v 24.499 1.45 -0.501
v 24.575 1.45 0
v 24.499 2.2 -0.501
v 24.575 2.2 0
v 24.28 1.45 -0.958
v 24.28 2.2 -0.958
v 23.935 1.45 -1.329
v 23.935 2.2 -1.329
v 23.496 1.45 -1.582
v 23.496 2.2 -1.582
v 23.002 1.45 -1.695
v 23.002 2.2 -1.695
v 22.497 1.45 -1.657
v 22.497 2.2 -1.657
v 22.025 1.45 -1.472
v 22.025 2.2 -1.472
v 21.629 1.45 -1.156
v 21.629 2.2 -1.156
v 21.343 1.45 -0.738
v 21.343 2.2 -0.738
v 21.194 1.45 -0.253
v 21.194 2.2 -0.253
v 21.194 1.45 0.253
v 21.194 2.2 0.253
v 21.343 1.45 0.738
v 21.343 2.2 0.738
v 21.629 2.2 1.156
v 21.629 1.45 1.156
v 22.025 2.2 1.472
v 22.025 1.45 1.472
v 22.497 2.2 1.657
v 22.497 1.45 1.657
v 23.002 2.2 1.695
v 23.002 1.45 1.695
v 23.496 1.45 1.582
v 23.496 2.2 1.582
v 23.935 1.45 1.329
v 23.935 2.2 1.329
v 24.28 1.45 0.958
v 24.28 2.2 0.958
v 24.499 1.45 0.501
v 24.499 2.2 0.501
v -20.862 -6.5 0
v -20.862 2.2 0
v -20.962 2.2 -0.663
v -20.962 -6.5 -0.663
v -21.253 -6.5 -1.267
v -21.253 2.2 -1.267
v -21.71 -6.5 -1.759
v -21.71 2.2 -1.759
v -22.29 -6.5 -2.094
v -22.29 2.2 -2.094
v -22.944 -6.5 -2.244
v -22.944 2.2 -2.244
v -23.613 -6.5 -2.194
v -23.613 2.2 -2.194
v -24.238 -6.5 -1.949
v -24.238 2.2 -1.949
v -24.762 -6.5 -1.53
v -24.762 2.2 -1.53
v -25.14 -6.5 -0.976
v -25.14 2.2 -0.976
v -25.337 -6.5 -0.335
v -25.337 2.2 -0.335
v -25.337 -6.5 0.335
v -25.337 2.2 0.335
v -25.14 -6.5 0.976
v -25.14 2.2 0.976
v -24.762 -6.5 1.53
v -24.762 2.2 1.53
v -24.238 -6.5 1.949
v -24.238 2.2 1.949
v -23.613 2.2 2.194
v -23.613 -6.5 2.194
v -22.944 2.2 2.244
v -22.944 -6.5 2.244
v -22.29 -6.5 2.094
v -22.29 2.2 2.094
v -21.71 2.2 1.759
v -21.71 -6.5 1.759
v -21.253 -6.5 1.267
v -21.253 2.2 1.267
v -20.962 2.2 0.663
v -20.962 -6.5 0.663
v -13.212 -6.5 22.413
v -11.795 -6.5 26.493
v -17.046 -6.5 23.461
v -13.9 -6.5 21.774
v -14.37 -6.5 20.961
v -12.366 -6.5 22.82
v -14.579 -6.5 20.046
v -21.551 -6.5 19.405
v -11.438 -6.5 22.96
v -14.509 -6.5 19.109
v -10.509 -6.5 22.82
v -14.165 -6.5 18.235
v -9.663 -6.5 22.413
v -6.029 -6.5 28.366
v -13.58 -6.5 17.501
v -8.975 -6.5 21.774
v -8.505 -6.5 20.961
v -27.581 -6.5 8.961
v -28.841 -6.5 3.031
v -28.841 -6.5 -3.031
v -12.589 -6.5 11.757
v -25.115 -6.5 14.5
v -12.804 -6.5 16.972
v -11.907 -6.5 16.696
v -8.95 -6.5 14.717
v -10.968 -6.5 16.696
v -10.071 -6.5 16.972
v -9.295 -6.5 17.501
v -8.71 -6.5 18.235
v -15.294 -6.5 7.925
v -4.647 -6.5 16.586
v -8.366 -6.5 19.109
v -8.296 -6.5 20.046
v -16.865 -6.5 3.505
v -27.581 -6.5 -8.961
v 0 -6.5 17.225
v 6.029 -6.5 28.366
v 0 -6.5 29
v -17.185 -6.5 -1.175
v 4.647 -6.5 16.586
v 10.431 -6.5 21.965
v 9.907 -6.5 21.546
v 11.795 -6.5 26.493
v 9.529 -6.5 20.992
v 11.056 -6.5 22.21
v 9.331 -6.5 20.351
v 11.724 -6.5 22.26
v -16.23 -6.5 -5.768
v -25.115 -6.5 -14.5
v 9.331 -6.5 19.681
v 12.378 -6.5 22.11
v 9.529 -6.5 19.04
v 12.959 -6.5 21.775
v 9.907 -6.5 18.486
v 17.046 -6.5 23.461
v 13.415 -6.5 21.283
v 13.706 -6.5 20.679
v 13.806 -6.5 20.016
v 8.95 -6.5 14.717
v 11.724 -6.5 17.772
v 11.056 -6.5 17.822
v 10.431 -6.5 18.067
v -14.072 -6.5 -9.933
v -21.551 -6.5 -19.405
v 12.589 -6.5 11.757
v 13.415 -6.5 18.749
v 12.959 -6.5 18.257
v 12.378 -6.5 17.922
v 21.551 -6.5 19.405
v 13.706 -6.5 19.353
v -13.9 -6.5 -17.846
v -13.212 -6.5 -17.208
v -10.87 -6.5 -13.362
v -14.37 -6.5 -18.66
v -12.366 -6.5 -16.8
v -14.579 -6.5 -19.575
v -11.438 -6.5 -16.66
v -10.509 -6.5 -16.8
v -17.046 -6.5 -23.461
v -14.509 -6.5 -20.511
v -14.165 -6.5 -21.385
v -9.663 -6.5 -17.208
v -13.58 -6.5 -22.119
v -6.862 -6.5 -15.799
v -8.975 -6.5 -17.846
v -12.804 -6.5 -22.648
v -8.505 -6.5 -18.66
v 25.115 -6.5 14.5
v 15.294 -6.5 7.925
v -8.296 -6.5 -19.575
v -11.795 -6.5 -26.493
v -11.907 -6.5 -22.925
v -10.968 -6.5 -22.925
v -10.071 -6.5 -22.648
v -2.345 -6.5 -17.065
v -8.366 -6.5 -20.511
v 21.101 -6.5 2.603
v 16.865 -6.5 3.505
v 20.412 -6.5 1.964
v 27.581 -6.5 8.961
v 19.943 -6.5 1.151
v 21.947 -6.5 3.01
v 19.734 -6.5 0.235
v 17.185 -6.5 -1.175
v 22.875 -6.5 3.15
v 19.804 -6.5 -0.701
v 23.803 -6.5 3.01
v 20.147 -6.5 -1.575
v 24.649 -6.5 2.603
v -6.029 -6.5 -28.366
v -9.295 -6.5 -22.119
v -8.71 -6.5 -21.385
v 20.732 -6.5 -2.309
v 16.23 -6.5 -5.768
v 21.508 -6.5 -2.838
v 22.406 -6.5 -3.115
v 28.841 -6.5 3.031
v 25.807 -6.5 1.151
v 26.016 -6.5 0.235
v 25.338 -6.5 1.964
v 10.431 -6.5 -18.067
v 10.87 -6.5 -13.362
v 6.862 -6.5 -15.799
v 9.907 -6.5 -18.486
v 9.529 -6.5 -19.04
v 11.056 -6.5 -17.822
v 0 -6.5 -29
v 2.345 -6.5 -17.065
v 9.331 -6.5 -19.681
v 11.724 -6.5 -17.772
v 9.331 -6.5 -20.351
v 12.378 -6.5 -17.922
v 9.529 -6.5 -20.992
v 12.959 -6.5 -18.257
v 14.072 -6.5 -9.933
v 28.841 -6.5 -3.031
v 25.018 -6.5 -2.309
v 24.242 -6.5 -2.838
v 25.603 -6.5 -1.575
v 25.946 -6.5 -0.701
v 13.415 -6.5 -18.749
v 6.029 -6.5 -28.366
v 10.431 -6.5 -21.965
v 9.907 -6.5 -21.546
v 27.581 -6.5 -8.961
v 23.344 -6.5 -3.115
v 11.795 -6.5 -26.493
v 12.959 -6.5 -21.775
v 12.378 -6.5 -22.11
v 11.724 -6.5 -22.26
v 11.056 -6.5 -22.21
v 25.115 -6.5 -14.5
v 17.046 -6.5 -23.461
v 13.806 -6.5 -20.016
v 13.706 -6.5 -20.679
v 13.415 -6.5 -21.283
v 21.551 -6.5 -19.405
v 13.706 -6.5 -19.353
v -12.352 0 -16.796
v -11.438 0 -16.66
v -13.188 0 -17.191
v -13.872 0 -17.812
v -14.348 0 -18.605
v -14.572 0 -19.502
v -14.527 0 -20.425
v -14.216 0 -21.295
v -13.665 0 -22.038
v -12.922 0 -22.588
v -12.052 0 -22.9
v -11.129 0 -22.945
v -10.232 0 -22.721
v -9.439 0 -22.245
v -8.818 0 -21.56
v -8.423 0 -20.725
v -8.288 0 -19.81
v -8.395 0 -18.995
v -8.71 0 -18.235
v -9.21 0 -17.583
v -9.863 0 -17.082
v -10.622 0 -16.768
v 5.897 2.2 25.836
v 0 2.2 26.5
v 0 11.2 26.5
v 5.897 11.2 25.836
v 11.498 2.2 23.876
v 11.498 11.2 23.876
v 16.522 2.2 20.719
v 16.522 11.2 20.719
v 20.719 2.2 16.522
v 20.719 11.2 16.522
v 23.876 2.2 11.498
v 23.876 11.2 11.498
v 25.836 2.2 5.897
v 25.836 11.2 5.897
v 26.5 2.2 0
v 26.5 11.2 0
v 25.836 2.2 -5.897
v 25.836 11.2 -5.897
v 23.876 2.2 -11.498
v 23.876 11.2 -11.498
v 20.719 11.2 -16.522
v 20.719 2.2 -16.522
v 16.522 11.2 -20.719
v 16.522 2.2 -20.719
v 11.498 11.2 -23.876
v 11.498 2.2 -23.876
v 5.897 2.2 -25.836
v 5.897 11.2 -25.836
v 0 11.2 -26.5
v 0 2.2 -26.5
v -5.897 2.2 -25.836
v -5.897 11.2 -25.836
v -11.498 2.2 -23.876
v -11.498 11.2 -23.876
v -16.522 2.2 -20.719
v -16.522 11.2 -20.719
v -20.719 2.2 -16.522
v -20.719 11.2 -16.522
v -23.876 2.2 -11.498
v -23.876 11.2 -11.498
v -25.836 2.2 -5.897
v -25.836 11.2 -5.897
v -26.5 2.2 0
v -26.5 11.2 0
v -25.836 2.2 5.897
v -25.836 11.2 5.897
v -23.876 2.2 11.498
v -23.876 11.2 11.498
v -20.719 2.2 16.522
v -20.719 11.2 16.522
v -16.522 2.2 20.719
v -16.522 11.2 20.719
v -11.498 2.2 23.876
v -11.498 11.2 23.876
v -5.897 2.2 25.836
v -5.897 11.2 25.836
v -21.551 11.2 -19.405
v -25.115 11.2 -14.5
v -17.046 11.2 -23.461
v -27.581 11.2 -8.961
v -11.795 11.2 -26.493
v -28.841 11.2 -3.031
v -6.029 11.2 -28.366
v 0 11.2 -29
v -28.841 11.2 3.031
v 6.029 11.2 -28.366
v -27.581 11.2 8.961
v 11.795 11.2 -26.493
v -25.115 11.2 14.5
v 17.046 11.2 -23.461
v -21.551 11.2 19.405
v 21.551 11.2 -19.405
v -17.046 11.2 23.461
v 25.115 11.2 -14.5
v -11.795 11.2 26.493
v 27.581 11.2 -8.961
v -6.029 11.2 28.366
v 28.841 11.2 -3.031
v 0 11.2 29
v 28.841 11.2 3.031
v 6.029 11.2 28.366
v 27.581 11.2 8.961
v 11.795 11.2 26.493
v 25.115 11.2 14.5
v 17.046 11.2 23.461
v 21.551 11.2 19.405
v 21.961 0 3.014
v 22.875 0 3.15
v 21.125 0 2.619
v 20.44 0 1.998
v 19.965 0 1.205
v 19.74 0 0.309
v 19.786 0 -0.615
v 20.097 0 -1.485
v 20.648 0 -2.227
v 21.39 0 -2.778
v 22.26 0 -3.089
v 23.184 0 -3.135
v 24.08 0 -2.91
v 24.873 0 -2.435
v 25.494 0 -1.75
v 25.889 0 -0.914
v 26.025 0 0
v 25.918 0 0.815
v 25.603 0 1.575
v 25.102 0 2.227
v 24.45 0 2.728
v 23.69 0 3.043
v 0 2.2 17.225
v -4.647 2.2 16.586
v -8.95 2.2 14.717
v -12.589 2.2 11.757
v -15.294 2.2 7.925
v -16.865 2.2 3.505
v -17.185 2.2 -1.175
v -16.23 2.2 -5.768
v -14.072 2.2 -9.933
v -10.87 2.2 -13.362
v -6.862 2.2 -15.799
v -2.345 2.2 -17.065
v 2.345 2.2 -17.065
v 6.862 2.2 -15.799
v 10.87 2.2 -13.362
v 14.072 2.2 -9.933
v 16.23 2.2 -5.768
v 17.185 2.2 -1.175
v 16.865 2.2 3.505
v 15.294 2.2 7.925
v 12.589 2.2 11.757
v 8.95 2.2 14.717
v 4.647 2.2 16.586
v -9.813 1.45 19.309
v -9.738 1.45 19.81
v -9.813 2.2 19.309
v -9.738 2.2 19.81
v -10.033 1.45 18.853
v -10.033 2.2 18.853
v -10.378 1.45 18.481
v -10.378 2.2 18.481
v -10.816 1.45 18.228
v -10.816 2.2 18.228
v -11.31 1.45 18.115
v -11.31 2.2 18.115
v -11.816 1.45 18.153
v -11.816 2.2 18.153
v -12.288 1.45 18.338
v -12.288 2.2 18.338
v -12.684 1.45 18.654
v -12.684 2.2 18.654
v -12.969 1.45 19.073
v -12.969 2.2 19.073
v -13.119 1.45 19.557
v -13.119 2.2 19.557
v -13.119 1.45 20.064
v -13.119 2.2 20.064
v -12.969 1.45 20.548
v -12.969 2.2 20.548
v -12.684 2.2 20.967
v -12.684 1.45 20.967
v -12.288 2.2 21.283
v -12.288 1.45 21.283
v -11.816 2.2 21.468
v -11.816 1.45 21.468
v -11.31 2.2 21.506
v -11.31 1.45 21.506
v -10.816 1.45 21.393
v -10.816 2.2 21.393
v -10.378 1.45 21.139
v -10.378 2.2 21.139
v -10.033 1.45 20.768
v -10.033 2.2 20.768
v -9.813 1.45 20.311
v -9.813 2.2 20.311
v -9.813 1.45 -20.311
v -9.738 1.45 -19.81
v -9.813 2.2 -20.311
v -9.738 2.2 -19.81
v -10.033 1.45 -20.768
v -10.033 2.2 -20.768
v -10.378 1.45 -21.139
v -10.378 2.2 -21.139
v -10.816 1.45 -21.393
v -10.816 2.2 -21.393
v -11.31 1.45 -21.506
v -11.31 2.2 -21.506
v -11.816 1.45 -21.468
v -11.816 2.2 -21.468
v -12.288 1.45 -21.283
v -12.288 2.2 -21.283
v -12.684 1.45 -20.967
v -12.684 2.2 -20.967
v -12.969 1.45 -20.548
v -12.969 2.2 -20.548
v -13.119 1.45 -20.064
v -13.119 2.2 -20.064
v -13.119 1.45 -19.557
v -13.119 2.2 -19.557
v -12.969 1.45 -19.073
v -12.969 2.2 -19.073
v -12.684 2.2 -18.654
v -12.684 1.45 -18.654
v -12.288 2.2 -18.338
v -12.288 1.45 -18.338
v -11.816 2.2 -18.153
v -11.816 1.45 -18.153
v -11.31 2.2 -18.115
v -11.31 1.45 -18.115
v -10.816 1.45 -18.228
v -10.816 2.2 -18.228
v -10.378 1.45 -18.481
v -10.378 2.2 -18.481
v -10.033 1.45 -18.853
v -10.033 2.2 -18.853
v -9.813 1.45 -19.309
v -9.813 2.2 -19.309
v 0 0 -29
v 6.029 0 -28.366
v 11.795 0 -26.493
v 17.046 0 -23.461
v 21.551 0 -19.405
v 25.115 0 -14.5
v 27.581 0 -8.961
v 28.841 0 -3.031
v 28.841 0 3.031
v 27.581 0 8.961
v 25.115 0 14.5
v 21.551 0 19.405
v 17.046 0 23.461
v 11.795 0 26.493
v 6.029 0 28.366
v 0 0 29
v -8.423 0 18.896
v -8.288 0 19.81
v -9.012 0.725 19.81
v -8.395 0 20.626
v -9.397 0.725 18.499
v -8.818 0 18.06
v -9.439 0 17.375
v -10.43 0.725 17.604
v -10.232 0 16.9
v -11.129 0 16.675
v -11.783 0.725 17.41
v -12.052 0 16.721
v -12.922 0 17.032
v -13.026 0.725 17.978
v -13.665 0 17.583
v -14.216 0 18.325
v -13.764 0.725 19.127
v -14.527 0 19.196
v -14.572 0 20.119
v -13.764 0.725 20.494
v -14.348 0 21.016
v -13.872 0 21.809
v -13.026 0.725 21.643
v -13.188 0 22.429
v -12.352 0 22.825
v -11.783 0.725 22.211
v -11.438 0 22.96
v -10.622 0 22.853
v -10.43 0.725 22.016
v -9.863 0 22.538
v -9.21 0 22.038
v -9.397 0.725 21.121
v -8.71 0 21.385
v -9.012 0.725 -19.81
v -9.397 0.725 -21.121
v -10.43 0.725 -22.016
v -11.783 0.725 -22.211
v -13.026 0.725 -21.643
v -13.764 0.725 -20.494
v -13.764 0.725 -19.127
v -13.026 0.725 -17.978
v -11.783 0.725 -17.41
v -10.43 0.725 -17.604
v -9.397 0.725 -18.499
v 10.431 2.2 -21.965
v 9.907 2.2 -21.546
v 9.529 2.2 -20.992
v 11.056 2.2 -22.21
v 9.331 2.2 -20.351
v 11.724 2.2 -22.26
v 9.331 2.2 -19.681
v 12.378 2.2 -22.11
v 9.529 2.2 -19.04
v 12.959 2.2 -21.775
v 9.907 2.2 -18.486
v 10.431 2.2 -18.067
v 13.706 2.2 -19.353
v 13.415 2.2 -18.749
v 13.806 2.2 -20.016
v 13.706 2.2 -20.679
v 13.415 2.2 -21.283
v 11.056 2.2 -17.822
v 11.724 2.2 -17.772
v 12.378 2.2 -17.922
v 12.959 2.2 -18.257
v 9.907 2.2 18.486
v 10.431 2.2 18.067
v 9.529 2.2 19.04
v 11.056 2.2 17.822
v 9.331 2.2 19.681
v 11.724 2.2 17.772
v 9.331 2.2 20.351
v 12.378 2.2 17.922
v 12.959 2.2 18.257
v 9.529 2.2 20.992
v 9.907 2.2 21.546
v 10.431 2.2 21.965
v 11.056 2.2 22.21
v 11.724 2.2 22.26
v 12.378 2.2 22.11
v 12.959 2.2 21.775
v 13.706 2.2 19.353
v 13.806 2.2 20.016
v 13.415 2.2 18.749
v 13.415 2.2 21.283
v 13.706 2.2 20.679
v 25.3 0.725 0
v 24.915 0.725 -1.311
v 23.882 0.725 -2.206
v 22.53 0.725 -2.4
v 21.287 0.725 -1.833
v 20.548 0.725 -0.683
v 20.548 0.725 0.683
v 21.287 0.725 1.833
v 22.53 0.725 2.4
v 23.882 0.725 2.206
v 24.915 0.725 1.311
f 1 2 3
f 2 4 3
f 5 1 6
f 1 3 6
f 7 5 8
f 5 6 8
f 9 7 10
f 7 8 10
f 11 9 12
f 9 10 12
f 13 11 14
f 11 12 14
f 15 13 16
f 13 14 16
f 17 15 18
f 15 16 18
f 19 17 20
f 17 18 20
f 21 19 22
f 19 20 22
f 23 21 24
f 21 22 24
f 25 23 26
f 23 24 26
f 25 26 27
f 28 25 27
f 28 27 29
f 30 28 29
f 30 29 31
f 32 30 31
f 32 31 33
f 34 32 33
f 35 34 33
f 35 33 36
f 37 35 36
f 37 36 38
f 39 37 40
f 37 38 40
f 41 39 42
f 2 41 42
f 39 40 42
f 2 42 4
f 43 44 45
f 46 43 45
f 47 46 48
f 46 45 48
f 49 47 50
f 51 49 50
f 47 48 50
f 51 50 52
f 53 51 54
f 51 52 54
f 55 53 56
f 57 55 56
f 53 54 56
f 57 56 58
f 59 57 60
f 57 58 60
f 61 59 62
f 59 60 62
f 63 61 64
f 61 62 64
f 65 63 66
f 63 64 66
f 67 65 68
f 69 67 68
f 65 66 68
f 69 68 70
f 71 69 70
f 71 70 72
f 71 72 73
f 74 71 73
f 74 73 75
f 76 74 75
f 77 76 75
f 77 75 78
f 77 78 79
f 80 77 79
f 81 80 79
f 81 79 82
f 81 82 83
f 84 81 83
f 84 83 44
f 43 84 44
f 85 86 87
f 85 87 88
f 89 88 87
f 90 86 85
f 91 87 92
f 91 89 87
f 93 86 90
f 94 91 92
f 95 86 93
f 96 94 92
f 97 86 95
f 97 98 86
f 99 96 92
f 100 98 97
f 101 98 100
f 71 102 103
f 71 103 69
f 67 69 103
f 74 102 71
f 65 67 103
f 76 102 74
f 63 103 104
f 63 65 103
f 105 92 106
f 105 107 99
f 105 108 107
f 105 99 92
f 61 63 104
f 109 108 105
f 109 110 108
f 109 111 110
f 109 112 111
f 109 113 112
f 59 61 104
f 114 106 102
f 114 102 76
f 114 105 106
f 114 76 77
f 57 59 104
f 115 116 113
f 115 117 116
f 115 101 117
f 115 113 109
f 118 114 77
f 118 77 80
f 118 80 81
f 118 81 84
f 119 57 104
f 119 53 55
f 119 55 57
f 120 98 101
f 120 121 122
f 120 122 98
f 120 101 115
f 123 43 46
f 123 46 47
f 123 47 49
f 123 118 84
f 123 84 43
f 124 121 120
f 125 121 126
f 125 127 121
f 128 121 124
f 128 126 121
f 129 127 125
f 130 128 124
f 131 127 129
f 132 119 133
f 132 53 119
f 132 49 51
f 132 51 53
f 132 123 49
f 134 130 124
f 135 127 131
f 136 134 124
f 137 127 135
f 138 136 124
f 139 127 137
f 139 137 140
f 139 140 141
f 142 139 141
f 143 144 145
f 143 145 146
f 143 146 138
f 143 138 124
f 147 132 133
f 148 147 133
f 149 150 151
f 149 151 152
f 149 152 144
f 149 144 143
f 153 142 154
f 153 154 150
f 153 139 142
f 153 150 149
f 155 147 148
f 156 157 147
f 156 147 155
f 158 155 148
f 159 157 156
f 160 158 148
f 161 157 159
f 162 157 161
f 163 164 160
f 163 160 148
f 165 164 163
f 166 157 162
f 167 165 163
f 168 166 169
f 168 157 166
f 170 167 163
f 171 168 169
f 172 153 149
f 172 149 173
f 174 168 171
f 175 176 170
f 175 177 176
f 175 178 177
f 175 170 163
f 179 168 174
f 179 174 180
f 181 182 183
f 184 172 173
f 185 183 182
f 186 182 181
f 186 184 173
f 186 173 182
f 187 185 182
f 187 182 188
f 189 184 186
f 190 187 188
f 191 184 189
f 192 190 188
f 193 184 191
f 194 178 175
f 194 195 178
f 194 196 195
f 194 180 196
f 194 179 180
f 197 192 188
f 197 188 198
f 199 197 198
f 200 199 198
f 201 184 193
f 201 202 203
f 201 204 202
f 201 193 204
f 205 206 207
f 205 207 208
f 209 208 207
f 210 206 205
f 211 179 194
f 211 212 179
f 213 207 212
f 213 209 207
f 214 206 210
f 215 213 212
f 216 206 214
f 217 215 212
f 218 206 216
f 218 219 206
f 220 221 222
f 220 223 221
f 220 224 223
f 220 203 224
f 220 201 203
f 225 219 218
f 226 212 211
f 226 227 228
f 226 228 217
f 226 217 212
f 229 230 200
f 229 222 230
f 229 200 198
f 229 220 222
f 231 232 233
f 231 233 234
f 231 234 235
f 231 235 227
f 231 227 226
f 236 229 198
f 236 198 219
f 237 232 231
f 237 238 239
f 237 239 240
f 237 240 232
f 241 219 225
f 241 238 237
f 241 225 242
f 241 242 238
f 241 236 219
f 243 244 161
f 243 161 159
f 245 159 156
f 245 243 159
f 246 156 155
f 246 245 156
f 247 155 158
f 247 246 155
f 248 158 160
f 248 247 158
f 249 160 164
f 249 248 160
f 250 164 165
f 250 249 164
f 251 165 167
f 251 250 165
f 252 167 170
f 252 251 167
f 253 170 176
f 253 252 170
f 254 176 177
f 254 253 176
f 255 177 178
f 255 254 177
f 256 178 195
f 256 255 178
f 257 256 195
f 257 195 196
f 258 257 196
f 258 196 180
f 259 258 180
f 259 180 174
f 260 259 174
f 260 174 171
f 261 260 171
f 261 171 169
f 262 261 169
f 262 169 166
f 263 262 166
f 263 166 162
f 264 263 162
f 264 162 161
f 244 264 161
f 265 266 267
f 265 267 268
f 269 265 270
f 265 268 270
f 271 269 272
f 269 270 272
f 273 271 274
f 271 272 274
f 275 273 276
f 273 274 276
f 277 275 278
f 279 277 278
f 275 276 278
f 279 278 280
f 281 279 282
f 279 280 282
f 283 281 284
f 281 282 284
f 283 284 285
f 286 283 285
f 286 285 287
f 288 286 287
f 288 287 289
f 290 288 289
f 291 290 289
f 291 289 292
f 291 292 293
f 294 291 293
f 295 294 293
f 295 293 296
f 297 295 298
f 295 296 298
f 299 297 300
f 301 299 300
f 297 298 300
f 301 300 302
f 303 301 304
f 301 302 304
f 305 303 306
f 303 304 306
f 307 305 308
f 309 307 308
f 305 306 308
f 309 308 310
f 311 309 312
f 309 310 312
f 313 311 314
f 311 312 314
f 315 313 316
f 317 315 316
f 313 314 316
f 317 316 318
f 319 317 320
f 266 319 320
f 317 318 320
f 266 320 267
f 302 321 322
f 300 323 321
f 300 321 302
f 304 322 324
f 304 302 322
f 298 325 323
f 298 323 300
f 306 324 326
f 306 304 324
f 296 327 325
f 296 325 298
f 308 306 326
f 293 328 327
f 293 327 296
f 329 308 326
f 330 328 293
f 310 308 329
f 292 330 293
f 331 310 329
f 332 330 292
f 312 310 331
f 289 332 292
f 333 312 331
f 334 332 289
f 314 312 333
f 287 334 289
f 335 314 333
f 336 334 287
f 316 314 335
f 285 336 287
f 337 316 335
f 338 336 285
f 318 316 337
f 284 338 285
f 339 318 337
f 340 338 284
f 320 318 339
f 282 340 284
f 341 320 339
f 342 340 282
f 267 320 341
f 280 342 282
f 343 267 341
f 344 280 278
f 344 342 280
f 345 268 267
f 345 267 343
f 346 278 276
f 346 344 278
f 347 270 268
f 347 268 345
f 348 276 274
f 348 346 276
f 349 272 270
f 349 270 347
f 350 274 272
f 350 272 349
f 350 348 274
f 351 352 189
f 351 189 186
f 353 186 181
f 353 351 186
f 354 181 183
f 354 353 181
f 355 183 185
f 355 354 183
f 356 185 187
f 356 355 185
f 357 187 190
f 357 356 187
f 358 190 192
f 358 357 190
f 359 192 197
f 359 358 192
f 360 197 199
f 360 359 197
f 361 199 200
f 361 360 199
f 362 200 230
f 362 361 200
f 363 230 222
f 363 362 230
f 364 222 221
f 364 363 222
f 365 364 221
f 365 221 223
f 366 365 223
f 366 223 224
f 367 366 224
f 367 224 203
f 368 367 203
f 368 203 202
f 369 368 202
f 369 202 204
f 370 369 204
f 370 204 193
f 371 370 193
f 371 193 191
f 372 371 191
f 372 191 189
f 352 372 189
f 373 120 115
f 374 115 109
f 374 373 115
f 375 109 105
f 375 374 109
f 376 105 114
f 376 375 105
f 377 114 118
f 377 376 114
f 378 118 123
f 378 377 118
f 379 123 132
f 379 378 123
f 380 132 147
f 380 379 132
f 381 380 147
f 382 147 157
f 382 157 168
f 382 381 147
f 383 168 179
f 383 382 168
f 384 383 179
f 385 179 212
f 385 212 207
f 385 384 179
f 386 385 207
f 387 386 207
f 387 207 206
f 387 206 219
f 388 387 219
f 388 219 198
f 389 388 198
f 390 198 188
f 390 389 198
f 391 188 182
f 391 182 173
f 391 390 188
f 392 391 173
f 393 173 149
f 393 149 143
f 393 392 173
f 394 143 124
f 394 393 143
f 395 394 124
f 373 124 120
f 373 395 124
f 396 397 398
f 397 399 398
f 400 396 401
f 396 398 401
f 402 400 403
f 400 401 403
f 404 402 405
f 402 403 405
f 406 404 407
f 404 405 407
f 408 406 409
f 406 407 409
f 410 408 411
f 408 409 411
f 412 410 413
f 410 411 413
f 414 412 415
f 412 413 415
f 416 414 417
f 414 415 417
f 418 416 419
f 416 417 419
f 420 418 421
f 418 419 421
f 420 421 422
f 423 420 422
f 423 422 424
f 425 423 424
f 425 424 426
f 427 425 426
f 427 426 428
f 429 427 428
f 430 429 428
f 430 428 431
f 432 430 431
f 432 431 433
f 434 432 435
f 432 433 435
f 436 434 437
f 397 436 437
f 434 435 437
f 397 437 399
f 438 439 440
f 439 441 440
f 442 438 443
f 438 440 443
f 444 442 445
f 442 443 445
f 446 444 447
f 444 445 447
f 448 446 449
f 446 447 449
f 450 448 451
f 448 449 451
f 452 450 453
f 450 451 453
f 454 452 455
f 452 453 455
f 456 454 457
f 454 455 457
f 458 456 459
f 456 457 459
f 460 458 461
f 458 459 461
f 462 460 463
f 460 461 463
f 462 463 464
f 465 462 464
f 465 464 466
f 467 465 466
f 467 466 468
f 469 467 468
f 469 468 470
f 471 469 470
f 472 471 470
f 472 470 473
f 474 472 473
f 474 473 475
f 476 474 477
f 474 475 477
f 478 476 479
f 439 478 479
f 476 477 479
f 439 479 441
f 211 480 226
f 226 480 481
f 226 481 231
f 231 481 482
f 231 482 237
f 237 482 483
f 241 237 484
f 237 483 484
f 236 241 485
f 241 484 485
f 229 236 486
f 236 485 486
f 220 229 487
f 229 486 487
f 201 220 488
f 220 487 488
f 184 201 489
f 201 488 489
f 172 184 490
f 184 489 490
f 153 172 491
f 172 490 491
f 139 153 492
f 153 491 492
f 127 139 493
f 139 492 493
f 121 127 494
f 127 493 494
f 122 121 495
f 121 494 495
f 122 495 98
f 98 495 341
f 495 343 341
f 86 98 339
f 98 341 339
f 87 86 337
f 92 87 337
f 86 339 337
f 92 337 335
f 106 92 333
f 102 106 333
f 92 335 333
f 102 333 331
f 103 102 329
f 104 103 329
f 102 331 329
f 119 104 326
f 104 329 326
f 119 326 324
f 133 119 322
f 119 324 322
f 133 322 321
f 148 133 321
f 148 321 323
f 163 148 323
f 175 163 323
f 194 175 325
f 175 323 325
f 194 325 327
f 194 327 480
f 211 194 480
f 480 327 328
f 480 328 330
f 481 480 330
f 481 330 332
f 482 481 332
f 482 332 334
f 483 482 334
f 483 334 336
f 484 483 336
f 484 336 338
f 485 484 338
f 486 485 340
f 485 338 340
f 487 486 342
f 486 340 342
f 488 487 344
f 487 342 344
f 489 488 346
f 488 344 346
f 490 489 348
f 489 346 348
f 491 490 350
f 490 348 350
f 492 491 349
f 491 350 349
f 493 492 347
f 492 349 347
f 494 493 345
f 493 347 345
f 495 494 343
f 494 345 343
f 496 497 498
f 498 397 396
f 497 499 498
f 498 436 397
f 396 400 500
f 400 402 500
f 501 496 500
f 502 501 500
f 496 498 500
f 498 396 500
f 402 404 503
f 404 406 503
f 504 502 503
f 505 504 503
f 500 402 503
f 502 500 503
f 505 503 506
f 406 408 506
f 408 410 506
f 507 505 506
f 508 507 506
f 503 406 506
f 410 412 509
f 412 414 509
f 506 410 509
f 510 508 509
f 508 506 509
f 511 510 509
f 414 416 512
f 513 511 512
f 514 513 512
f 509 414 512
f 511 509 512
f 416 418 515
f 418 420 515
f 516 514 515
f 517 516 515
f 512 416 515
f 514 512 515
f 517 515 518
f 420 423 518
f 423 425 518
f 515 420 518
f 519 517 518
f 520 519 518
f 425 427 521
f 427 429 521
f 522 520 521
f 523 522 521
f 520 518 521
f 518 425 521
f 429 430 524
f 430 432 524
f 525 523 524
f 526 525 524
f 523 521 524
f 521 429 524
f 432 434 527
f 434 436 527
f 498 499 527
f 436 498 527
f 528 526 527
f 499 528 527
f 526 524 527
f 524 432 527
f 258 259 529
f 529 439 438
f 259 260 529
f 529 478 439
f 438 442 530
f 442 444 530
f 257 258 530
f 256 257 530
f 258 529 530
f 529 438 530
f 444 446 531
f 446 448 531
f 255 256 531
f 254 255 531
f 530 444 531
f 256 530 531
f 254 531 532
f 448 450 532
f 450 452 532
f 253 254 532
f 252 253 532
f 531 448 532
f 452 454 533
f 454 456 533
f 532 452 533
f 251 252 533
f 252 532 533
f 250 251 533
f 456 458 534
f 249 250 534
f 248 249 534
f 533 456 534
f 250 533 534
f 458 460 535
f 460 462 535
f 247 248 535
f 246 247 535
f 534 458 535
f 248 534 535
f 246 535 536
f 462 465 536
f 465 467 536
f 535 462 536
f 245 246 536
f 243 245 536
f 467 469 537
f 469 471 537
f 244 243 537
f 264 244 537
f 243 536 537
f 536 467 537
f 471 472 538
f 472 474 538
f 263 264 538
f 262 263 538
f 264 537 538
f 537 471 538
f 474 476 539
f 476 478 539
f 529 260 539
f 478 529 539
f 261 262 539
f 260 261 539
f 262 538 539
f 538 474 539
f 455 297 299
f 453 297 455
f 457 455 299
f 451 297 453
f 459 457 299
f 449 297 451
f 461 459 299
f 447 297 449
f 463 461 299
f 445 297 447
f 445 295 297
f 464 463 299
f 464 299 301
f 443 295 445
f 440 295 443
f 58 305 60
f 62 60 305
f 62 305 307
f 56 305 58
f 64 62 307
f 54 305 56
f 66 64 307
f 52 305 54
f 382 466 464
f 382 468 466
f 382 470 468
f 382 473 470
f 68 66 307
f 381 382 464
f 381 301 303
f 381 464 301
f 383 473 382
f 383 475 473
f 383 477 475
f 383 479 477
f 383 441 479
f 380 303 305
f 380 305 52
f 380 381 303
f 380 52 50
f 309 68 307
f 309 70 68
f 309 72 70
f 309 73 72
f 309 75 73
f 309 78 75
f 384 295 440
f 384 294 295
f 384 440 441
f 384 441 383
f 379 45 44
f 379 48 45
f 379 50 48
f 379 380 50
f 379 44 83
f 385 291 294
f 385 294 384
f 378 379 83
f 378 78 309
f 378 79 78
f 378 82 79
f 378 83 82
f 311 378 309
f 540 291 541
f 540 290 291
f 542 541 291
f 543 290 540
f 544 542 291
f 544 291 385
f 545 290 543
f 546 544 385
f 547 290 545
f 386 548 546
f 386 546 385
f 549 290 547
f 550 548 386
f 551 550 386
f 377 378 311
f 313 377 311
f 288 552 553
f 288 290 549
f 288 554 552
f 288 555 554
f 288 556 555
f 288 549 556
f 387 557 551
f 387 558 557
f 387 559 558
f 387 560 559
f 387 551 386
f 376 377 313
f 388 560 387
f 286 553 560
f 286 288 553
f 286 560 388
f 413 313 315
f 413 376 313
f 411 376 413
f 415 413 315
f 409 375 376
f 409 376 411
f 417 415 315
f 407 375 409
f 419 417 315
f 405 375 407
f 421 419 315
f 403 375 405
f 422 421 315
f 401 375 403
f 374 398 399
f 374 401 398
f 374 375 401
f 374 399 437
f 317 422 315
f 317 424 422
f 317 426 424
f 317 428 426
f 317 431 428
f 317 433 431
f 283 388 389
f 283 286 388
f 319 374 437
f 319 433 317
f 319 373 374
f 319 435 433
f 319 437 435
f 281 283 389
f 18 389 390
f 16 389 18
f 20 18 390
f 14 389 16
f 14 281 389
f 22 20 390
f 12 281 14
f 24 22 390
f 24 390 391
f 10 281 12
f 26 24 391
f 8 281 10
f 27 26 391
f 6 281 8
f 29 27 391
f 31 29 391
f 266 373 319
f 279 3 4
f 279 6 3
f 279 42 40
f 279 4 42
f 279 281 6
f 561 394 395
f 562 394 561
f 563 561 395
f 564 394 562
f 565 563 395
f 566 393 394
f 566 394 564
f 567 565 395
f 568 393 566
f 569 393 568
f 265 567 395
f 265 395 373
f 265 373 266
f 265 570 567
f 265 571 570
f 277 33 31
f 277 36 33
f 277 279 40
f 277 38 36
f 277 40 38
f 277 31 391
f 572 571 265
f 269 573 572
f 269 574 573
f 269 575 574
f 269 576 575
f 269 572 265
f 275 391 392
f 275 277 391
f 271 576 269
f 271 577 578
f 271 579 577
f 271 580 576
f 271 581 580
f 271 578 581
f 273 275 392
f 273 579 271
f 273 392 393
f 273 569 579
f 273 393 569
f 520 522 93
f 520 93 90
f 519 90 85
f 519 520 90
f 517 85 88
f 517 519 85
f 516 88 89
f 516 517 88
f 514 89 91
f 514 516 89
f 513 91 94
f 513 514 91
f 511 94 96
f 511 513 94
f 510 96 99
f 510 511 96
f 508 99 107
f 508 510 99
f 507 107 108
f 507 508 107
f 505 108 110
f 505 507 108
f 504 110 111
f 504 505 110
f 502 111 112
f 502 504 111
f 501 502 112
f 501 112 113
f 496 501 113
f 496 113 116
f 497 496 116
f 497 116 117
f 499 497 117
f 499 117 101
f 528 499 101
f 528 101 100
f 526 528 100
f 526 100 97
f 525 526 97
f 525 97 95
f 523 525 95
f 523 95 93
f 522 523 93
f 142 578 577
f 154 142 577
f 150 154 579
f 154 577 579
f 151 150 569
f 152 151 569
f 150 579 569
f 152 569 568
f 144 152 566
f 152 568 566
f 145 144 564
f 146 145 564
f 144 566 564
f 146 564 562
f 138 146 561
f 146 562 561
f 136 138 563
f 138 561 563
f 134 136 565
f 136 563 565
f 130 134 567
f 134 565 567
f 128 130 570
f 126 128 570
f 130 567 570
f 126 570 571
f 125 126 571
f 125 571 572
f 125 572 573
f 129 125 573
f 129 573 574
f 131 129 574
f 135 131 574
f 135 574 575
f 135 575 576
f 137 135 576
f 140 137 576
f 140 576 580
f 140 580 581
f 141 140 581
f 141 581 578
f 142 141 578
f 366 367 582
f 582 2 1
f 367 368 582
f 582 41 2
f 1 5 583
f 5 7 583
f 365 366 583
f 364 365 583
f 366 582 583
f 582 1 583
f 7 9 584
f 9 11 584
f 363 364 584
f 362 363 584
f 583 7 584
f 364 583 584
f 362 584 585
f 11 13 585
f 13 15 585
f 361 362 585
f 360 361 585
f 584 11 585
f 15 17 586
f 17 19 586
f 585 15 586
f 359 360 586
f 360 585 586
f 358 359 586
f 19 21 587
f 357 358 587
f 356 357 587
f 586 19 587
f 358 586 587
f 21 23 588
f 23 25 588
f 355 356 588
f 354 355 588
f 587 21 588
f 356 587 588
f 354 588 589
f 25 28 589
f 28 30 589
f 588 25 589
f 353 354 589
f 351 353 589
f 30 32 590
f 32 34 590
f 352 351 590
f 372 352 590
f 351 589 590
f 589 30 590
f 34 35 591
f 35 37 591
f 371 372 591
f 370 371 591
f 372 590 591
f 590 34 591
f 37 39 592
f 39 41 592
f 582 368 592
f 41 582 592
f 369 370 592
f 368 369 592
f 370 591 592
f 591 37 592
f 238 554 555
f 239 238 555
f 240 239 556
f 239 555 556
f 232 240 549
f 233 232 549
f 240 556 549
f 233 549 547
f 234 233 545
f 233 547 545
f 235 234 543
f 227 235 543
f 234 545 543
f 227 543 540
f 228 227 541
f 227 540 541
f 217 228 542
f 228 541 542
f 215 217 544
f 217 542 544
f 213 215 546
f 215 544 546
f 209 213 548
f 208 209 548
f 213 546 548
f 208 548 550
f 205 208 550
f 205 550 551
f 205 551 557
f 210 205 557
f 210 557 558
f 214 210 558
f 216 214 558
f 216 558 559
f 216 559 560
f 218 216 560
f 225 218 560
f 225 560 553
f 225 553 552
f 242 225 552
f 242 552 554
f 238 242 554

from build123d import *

# Parameters (mm, degrees)
ESQUISSE1_R                                    = 29
BOSS_EXTRU_1_DEPTH                             = 11.2
ESQUISSE2_R                                    = 26.5
ENL_V_MAT_EXTRU_1_DEPTH                        = 9
ESQUISSE3_R                                    = 17.225
ENL_V_MAT_EXTRU_2_DEPTH                        = 42.98809355
FRAISAGE_POUR_VIS_T_TE_FRAIS_E_M31_D           = 3.4
FRAISAGE_POUR_VIS_T_TE_FRAIS_E_M31_CSINK_D     = 6.3
FRAISAGE_POUR_VIS_T_TE_FRAIS_E_M31_CSINK_ANGLE = 90
ESQUISSE7_R                                    = 29
ESQUISSE7_R_2                                  = 17.225
ESQUISSE7_R_3                                  = 3.15
BOSS_EXTRU_2_DEPTH                             = 6.5
DIAM_TRE_DU_PER_AGE_4_5_4_5_1_D                = 4.5


with BuildPart() as part:
    # Esquisse1 → Boss.-Extru.1 (new body)
    with BuildSketch(Plane(origin=(0, 0, 0), x_dir=(1, 0, 0), z_dir=(0, 1, 0))):
        with Locations(Location((0, 0, 0), (0, 0, 270))):
            Circle(ESQUISSE1_R)
    extrude(amount=BOSS_EXTRU_1_DEPTH)

    # Esquisse2 → Enlèv. mat.-Extru.1 (cut)
    with BuildSketch(Plane(origin=(0, 11.2, 0), x_dir=(1, 0, 0), z_dir=(0, 1, 0))):
        with Locations(Location((0, 0, 0), (0, 0, 270))):
            Circle(ESQUISSE2_R)
    extrude(amount=-ENL_V_MAT_EXTRU_1_DEPTH, mode=Mode.SUBTRACT)

    # Esquisse3 → Enlèv. mat.-Extru.2 (cut, through all)
    with BuildSketch(Plane(origin=(0, 2.2, 0), x_dir=(1, 0, 0), z_dir=(0, 1, 0))):
        with Locations(Location((0, 0, 0), (0, 0, 270))):
            Circle(ESQUISSE3_R)
    extrude(amount=-ENL_V_MAT_EXTRU_2_DEPTH, mode=Mode.SUBTRACT)

    # Fraisage pour vis à tête fraisée M31 (through all)
    with Locations(Plane(origin=(0, 0, 0), x_dir=(-1, 0, 0), z_dir=(0, -1, 0))):
        with Locations((-22.875, 0), (11.4375, 19.810331112), (11.4375, -19.810331112), (0, 0)):
            CounterSinkHole(FRAISAGE_POUR_VIS_T_TE_FRAIS_E_M31_D / 2, FRAISAGE_POUR_VIS_T_TE_FRAIS_E_M31_CSINK_D / 2, counter_sink_angle=FRAISAGE_POUR_VIS_T_TE_FRAIS_E_M31_CSINK_ANGLE)

    # Esquisse7 → Boss.-Extru.2 (add)
    with BuildSketch(Plane.XZ):
        with Locations(Location((0, 0, 0), (0, 0, 270))):
            Circle(ESQUISSE7_R)
        with Locations(Location((0, 0, 0), (0, 0, 90))):
            Circle(ESQUISSE7_R_2, mode=Mode.SUBTRACT)
        with Locations(Location((-11.4375, 19.810331112, 0), (0, 0, 90))):
            Circle(ESQUISSE7_R_3, mode=Mode.SUBTRACT)
        with Locations(Location((-11.4375, -19.810331112, 0), (0, 0, 90))):
            Circle(ESQUISSE7_R_3, mode=Mode.SUBTRACT)
        with Locations(Location((22.875, 0, 0), (0, 0, 90))):
            Circle(ESQUISSE7_R_3, mode=Mode.SUBTRACT)
    extrude(amount=BOSS_EXTRU_2_DEPTH)

    # Diamètre du perçage Ø4.5 (4.5)1 (through all)
    with Locations(Plane(origin=(0, -6.5, 0), x_dir=(-1, 0, 0), z_dir=(0, -1, 0))):
        with Locations((0, 0), (23.1125, 0), (-11.55625, -20.016012145), (-11.55625, 20.016012145)):
            Hole(DIAM_TRE_DU_PER_AGE_4_5_4_5_1_D / 2)


solid = part.part
